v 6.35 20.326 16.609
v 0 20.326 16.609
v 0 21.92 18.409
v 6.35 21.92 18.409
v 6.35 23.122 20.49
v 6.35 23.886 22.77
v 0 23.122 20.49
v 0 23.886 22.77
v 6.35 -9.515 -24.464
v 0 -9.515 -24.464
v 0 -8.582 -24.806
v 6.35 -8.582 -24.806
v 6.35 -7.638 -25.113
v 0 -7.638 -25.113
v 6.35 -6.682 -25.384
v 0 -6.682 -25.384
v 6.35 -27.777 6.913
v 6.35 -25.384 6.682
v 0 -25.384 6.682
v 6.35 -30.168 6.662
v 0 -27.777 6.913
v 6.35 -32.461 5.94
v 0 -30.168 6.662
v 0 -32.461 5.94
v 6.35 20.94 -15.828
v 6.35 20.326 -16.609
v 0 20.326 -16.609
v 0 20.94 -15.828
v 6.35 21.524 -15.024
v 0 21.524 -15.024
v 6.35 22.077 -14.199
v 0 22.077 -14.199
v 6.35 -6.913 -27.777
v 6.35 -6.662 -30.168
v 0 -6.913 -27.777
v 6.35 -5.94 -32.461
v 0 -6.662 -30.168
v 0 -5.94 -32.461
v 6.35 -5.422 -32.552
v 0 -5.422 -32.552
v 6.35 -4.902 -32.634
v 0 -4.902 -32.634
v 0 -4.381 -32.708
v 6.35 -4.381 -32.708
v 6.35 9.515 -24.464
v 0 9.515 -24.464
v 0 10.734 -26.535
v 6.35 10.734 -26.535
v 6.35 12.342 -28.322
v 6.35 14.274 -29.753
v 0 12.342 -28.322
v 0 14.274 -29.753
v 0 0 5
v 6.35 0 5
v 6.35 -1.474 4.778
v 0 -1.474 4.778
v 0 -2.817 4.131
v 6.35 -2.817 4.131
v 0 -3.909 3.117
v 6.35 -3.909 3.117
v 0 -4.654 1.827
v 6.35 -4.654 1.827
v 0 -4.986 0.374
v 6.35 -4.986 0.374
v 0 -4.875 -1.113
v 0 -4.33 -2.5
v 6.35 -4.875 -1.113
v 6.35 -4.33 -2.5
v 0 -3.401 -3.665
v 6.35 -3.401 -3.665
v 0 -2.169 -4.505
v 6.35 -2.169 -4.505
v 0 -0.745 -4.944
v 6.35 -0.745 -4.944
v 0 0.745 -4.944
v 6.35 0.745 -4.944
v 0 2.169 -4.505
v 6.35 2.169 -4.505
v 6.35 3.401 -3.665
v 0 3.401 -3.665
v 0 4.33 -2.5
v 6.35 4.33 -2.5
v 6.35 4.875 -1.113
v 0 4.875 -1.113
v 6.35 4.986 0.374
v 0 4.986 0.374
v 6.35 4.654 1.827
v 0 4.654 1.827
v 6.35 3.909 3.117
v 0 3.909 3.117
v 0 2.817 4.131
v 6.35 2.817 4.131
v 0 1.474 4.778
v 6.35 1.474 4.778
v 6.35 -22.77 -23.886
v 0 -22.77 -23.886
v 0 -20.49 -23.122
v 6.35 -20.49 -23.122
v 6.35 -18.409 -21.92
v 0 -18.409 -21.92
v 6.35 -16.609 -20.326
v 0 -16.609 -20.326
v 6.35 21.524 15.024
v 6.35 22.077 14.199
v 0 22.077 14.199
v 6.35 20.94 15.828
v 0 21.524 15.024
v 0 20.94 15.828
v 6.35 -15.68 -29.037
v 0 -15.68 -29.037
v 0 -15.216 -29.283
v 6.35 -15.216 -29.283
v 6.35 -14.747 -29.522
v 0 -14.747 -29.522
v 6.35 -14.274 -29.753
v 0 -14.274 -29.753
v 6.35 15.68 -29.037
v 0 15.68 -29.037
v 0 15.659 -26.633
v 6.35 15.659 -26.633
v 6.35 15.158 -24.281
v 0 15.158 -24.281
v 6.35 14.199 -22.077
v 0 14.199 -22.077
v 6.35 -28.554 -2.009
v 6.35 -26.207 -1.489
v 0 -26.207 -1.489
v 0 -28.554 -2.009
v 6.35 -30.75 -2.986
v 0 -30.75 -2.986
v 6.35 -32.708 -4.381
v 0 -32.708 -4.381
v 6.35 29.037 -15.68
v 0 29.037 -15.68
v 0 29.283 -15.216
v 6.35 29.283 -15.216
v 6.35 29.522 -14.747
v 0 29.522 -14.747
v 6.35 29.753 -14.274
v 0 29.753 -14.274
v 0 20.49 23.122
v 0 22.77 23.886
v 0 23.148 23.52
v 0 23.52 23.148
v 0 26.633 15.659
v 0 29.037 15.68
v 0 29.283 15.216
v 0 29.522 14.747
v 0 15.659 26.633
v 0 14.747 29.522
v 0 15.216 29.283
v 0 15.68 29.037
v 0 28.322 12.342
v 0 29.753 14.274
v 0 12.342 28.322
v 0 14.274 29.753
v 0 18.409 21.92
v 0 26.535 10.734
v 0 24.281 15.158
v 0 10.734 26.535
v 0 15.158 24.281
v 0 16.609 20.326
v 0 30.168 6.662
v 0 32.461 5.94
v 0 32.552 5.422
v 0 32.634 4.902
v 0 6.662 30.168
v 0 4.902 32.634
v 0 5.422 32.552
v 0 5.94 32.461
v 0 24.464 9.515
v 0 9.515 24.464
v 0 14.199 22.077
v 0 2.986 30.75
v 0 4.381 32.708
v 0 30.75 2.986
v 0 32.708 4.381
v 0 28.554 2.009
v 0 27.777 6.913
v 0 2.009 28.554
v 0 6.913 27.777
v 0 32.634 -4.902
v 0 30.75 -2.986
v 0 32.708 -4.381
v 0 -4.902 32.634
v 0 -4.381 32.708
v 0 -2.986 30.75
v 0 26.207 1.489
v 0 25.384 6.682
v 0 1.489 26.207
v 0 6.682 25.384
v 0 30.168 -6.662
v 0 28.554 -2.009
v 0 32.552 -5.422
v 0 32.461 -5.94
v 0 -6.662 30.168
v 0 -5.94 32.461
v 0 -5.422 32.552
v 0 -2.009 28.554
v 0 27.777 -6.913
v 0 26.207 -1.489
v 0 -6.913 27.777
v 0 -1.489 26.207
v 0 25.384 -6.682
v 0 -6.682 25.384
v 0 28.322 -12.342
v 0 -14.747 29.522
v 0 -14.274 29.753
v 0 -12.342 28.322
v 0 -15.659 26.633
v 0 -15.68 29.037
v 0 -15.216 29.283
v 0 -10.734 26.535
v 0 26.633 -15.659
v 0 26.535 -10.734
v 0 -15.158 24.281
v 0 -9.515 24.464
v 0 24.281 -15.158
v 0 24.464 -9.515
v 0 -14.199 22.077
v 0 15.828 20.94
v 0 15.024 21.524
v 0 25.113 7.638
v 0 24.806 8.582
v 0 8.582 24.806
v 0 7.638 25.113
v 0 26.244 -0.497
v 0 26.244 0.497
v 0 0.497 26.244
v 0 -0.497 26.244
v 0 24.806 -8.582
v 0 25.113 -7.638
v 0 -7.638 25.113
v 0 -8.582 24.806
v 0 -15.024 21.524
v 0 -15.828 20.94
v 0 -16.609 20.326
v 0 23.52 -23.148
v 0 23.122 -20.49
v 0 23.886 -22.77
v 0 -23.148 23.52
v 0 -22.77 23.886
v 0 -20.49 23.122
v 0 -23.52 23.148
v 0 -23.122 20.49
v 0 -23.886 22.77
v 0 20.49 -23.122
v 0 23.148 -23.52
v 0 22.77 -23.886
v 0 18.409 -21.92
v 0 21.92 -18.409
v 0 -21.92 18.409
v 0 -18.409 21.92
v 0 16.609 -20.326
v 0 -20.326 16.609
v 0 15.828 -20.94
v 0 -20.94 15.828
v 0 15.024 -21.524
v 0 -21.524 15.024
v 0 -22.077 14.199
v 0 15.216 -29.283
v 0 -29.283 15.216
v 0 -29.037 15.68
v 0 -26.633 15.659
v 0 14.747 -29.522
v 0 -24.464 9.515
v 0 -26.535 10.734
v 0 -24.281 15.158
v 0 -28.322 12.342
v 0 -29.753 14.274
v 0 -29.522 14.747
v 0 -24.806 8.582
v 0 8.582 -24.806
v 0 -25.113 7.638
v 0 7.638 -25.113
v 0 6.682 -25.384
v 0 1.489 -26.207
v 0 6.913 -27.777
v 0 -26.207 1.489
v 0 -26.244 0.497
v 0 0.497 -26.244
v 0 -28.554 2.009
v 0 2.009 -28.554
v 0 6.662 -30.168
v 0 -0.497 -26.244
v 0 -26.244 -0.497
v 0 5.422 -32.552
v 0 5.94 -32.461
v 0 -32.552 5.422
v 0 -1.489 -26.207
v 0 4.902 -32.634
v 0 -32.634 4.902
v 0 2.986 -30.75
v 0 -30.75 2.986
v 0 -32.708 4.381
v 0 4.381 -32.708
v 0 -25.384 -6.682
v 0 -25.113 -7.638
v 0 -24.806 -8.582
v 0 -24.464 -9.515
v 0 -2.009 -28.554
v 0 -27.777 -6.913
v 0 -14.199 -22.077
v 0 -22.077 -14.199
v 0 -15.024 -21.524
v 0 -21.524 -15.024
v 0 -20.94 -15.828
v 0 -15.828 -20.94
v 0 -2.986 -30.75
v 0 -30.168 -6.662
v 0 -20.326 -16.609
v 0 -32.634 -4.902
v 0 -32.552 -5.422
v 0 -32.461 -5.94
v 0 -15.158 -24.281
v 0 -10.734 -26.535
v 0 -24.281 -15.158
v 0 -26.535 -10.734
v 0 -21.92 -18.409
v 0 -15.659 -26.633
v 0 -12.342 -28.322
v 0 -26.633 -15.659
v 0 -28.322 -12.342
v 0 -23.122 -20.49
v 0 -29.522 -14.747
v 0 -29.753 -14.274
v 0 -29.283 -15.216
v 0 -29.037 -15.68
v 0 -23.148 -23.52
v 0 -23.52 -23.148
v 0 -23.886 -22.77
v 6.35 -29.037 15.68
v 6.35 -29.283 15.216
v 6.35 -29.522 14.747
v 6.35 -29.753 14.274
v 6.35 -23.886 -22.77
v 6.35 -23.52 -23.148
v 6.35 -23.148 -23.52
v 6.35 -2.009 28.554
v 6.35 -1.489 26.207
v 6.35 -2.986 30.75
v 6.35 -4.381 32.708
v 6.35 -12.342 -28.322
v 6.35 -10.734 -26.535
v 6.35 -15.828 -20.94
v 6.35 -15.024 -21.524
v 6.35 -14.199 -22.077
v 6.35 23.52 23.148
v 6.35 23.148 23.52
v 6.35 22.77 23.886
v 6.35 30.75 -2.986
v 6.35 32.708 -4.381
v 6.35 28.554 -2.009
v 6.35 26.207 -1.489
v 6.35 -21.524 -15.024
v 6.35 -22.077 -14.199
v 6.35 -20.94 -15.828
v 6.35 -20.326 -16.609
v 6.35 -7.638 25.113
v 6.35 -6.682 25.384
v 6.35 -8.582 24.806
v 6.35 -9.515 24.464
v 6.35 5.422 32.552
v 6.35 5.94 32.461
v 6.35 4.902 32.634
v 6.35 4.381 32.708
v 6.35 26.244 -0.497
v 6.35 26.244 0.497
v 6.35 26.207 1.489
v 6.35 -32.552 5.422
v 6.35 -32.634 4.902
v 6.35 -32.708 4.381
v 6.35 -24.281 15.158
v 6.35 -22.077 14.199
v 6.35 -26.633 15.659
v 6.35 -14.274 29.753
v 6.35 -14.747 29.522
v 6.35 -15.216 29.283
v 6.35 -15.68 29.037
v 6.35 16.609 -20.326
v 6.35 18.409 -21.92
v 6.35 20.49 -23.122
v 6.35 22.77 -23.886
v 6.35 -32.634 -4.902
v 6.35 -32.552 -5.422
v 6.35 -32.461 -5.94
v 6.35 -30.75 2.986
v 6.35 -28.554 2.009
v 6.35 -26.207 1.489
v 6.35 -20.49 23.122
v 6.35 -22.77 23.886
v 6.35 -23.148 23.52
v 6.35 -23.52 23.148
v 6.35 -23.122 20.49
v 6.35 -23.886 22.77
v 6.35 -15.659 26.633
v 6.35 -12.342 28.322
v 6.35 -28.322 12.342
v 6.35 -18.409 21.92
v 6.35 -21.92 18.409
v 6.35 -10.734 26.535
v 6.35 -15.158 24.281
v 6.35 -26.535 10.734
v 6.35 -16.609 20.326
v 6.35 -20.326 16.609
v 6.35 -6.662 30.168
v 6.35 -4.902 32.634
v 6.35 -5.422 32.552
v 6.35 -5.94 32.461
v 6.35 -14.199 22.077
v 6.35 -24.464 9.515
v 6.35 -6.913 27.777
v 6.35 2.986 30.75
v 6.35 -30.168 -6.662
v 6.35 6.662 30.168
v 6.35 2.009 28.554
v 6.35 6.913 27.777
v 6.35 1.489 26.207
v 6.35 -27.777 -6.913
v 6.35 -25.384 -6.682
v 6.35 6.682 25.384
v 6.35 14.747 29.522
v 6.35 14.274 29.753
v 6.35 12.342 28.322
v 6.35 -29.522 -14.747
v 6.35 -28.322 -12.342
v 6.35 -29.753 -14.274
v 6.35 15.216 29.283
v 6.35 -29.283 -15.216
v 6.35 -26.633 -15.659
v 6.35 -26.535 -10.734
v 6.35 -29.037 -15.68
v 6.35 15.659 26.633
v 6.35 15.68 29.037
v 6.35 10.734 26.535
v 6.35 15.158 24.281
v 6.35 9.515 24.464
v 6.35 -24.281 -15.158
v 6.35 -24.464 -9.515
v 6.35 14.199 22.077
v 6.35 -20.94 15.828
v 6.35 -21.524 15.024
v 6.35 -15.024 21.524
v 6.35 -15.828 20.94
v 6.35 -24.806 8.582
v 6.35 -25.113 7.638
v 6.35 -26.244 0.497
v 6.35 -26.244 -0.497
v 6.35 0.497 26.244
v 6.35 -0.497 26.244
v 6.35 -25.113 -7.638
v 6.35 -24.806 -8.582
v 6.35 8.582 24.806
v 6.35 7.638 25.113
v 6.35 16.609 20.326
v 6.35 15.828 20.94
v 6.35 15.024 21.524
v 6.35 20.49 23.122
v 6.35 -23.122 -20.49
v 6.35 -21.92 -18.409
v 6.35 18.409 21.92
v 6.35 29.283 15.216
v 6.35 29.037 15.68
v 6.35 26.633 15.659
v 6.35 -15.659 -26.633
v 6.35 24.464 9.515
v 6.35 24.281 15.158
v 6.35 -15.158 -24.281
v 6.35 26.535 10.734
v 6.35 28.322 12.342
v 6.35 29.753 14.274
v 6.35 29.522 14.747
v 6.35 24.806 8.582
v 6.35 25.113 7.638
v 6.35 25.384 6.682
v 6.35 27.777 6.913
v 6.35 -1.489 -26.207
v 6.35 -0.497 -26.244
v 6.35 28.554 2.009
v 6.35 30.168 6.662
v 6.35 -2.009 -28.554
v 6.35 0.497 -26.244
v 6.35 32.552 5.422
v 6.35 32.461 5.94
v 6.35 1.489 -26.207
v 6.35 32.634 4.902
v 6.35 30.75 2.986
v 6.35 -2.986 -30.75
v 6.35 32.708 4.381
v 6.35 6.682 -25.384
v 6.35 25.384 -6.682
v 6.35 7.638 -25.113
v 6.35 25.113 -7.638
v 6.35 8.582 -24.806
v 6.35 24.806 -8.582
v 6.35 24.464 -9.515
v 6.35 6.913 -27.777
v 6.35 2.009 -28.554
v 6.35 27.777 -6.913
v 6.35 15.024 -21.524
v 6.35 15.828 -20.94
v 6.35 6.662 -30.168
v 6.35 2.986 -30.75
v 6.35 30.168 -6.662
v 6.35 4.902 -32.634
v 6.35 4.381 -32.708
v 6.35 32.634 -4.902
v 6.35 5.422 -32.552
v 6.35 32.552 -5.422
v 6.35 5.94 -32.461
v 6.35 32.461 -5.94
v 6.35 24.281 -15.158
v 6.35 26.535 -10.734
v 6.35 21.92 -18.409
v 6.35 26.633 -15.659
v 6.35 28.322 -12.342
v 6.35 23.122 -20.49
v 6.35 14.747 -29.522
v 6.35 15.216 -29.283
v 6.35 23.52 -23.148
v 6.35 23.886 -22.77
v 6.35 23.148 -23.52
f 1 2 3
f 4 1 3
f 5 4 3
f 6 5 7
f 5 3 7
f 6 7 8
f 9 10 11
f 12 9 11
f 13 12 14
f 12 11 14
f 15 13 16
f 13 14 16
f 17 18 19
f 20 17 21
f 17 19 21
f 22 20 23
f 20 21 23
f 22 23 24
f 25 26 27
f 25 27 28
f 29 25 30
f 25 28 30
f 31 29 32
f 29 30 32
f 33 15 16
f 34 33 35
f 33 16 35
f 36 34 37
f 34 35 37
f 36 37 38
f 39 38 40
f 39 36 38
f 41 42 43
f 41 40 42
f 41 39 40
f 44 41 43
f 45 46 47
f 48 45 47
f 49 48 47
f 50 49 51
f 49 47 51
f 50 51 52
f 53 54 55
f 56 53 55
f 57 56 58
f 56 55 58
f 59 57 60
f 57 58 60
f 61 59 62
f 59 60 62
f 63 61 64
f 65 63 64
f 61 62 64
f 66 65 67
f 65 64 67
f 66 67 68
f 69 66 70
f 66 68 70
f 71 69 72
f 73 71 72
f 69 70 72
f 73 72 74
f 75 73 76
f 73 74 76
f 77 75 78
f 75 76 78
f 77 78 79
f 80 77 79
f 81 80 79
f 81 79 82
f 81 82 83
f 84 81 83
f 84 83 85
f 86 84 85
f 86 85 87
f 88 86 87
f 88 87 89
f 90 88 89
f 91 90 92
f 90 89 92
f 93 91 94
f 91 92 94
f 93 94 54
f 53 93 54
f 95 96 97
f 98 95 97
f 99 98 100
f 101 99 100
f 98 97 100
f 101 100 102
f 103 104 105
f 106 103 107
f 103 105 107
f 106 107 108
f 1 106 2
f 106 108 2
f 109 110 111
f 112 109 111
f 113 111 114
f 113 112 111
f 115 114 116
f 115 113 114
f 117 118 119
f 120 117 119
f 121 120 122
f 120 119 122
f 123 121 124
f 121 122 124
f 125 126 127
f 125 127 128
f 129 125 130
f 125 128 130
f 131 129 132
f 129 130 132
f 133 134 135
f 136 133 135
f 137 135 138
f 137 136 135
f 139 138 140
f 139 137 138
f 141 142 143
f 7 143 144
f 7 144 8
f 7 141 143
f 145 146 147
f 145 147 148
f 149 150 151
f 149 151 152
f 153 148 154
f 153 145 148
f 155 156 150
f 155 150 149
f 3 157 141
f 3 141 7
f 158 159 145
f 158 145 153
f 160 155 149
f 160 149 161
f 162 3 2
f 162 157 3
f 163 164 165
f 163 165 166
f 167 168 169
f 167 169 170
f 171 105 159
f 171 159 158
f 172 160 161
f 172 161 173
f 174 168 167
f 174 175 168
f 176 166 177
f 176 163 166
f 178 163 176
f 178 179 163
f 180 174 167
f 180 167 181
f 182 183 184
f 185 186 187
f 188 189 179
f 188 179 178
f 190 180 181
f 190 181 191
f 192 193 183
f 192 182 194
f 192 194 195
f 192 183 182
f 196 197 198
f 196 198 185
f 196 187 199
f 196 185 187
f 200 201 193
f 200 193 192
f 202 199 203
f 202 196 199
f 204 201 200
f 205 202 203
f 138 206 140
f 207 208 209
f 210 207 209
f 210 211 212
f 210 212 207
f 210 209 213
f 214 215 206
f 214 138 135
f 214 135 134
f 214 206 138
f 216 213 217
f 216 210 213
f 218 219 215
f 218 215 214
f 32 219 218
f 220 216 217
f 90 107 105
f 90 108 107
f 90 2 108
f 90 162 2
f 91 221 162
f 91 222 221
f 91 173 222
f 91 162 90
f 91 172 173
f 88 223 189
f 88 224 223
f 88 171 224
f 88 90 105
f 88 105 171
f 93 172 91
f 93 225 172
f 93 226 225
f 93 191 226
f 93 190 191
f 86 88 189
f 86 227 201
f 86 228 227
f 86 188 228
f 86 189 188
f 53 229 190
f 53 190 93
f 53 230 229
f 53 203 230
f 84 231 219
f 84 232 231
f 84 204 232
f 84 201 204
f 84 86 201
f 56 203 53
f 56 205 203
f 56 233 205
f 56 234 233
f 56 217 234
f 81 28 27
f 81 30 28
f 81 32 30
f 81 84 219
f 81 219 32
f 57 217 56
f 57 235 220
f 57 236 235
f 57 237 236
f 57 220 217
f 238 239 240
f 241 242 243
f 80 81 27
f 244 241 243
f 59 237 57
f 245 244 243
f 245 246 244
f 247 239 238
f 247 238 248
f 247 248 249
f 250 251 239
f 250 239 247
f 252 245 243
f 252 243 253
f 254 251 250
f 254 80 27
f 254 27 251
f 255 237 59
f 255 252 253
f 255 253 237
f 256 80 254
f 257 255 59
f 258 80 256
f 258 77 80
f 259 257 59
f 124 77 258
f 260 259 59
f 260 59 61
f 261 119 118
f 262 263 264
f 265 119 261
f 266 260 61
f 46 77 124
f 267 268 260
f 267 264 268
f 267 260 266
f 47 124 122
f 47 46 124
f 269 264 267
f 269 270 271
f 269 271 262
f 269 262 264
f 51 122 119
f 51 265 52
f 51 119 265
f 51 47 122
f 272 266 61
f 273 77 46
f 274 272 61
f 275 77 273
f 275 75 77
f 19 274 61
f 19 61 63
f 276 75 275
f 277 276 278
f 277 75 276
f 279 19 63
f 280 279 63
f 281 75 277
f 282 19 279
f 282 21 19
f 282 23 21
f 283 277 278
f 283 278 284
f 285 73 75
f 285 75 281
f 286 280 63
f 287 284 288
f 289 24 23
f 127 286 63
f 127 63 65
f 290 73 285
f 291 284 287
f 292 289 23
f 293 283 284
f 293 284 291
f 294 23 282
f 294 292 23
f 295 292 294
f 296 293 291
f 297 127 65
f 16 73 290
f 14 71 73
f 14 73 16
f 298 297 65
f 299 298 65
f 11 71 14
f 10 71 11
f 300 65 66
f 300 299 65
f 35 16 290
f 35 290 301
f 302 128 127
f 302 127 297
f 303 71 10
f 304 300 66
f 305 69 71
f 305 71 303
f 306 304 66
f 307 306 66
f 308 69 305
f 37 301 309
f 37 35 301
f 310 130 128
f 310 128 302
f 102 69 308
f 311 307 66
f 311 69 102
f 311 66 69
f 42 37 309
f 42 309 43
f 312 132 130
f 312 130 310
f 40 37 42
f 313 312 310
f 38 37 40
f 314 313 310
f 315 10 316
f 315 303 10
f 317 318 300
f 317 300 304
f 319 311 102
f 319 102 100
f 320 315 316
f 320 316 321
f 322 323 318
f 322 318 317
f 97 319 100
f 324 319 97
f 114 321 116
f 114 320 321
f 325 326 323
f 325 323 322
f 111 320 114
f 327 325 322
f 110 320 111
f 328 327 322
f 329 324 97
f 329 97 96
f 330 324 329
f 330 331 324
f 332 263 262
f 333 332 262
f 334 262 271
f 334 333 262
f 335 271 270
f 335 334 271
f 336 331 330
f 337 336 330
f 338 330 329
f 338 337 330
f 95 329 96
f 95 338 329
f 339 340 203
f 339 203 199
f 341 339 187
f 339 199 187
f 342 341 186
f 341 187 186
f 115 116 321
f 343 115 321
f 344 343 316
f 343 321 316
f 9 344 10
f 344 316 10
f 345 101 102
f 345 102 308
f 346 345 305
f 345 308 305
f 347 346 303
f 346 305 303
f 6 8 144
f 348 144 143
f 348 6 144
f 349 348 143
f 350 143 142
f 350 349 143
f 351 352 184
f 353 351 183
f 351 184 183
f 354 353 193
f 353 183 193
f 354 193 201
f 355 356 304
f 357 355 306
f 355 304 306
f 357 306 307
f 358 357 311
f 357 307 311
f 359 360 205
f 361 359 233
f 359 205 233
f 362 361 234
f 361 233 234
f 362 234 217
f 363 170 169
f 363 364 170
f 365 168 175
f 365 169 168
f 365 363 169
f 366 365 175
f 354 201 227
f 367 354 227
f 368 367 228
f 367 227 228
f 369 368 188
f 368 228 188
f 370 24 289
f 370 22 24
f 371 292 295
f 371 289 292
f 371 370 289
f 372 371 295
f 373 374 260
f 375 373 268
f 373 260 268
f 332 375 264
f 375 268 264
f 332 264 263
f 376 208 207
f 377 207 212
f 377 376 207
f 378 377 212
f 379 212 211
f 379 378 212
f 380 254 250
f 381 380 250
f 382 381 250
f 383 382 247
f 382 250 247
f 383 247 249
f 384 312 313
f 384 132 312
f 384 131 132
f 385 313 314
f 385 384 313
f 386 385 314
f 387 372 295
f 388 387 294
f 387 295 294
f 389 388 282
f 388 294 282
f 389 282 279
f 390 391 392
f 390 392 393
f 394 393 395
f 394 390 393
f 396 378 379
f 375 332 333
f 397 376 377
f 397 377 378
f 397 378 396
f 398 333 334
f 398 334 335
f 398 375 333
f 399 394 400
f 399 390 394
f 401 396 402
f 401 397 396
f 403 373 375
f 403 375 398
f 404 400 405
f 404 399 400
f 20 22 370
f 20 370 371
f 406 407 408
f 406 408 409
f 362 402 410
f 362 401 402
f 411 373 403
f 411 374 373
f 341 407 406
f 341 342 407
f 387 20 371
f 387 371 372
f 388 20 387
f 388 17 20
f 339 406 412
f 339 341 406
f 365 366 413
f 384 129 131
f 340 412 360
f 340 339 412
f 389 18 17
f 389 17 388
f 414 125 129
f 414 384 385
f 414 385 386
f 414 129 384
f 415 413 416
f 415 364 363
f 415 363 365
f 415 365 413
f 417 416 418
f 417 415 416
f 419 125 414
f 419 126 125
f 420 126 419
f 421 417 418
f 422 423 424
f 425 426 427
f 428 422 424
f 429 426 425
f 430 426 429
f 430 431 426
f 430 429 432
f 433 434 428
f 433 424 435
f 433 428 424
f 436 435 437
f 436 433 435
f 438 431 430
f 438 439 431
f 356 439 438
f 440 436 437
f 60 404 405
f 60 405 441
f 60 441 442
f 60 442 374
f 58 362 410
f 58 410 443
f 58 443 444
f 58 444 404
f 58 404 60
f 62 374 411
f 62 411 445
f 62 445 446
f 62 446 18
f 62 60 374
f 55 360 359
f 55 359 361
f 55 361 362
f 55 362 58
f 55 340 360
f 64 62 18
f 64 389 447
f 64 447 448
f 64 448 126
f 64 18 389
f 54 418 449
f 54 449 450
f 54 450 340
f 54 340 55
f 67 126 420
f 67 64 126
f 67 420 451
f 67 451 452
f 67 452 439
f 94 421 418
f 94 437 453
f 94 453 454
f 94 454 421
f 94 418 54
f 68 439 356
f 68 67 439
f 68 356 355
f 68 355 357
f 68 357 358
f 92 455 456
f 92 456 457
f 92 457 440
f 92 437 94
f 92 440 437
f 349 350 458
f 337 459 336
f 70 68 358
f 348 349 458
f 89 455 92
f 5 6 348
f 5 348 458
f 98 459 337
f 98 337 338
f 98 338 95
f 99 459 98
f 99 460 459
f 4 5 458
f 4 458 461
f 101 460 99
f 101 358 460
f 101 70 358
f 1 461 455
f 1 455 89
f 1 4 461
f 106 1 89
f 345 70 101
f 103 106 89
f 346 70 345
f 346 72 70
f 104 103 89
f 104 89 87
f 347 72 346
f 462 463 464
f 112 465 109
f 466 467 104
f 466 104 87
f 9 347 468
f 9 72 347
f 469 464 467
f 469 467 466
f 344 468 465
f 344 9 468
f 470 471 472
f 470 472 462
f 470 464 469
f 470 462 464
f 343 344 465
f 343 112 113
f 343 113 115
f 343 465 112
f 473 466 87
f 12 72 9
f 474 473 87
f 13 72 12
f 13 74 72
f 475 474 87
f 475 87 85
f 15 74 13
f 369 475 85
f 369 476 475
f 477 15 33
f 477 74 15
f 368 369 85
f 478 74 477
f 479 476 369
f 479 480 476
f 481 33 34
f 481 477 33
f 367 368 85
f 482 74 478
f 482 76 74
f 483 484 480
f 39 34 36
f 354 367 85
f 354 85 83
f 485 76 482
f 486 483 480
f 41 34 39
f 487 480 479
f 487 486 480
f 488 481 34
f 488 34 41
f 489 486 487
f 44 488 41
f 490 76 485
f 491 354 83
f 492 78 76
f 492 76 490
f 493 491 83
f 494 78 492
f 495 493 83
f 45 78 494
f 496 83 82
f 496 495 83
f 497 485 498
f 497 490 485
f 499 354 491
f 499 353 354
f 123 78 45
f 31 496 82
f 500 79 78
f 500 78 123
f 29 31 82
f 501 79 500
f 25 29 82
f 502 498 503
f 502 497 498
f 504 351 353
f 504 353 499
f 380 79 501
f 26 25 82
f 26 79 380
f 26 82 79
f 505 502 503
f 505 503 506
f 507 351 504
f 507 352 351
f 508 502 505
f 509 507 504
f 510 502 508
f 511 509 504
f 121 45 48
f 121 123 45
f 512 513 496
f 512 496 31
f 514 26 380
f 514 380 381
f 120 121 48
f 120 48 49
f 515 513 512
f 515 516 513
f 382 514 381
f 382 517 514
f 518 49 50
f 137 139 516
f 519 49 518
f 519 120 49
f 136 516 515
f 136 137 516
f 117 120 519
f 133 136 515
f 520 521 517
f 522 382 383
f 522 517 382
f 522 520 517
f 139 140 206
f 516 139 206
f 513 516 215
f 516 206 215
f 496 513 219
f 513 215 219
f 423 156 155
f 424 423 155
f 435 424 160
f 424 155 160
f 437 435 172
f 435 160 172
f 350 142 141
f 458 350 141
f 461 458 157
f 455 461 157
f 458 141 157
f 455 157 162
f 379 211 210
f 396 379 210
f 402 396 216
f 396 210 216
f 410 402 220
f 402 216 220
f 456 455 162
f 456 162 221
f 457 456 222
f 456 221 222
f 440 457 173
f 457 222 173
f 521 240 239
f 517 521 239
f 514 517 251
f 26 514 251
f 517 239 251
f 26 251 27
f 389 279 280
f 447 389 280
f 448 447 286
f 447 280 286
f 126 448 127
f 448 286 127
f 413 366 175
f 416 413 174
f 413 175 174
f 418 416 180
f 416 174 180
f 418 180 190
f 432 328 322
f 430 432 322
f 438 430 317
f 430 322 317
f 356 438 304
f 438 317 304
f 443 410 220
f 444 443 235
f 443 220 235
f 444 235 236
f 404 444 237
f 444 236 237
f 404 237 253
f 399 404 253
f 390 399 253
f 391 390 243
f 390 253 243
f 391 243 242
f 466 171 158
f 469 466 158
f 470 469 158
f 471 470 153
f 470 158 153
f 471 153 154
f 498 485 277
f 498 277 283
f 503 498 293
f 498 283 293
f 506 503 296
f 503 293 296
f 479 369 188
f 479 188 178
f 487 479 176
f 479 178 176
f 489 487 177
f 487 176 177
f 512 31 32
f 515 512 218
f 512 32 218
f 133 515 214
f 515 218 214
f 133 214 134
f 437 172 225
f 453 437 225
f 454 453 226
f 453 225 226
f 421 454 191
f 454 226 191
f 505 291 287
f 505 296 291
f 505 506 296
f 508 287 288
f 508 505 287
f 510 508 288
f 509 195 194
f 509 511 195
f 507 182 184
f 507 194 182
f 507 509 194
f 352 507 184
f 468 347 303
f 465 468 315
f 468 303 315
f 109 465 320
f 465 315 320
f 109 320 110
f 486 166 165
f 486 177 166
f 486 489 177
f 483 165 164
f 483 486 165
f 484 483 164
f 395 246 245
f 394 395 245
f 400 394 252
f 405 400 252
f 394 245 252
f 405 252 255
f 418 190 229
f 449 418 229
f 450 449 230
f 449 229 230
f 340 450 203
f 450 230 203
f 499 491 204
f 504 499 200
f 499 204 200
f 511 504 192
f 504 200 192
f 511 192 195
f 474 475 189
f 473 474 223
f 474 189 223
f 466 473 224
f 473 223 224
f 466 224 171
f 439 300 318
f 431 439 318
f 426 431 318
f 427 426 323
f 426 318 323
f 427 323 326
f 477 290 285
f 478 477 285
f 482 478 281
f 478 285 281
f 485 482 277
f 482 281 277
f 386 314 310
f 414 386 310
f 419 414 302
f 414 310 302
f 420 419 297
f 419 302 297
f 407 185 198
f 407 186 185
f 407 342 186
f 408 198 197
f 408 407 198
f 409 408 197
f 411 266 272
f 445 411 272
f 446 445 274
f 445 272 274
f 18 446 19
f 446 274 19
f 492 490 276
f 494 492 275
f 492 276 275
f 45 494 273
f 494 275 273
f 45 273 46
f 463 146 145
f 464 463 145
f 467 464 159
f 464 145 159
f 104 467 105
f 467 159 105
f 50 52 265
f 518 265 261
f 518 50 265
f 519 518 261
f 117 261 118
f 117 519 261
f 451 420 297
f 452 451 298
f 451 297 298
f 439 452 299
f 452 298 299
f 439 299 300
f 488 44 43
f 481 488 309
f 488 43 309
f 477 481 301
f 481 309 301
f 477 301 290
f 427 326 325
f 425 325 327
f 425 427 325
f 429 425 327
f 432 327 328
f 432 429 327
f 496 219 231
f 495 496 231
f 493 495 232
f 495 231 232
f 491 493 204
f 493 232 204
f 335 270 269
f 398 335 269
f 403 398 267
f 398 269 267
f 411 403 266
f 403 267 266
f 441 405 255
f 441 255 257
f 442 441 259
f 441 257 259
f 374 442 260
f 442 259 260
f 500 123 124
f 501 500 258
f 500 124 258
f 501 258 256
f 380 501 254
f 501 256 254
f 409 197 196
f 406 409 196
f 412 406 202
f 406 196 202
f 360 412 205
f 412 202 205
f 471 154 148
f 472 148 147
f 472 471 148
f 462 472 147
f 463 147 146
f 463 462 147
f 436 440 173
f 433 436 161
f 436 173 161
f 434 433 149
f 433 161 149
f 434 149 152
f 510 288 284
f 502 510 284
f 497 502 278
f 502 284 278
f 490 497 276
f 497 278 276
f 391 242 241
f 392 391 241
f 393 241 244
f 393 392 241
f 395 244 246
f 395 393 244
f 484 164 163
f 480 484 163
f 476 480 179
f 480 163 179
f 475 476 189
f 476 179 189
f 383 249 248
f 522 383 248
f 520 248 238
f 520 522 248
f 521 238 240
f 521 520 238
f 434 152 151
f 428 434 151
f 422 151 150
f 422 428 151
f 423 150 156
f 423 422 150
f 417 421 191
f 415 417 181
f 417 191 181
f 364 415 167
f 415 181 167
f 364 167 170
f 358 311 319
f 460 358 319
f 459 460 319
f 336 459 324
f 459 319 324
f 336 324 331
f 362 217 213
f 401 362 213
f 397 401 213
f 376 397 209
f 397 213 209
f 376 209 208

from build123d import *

# Parameters (mm, degrees)
BASPROSKE_W        = 12.7
BASPROSKE_H        = 33
TOOTHCUT_DEPTH     = 49.366207211
TEETHCUTS_COUNT    = 20
TEETHCUTS_ANGLE    = 342
BORSKE_R           = 5
BORE_DEPTH         = 50.0000508
CUT_EXTRUDE1_START = -6.35
CUT_EXTRUDE1_DEPTH = 6.35


with BuildPart() as part:
    # BasProSke → Base-Revolve (revolve)
    with BuildSketch(Plane(origin=(0, 0, 0), x_dir=(1, 0, 0), z_dir=(0, 1, 0)), mode=Mode.PRIVATE) as base_revolve_sk:
        with Locations((6.35, 16.5)):
            Rectangle(BASPROSKE_W, BASPROSKE_H)
    revolve(base_revolve_sk.sketch.rotate(Axis((-10, 0, 0), (1, 0, 0)), 180), axis=Axis((-10, 0, 0), (1, 0, 0)))

    # TooCutSke → ToothCut (cut, through all)
    with BuildSketch(Plane(origin=(0, 0, 0), x_dir=(0, 0, -1), z_dir=(1, 0, 0))):
        with BuildLine():
            ThreePointArc((1.489278925, 26.206717637), (0, 26.249), (-1.489278925, 26.206717637))
            ThreePointArc((-1.489278925, 26.206717637), (-2.448651415, 29.690511169), (-4.401620335, 32.730762038))
            ThreePointArc((-4.401620335, 32.730762038), (0, 33.0254), (4.401620335, 32.730762038))
            ThreePointArc((4.401620335, 32.730762038), (2.448651415, 29.690511169), (1.489278925, 26.206717637))
        make_face()
    toothcut = extrude(amount=TOOTHCUT_DEPTH, mode=Mode.SUBTRACT)

    # TeethCuts: ToothCut ×20 about axis
    teethcuts_axis = Axis((-10, 0, 0), (1, 0, 0))
    for i in range(1, TEETHCUTS_COUNT):
        add(toothcut.rotate(teethcuts_axis, i * TEETHCUTS_ANGLE / (TEETHCUTS_COUNT - 1)), mode=Mode.SUBTRACT)

    # BorSke → Bore (cut, symmetric)
    with BuildSketch(Plane(origin=(0, 0, 0), x_dir=(0, 0, -1), z_dir=(1, 0, 0))):
        with Locations(Location((0, 0, 0), (0, 0, 180))):
            Circle(BORSKE_R)
    extrude(amount=BORE_DEPTH, both=True, mode=Mode.SUBTRACT)

    # Sketch1 → Cut-Extrude1 (cut)
    with BuildSketch(Plane(origin=(12.7, 0, 0), x_dir=(0, 0, -1), z_dir=(1, 0, 0)).offset(CUT_EXTRUDE1_START)):
        with BuildLine():
            ThreePointArc((-32.707837592, 4.381479207), (-29.676574647, 2.442440757), (-26.206717637, 1.489278925))
            ThreePointArc((-26.206717637, 1.489278925), (-26.249, 0), (-26.206717637, -1.489278925))
            ThreePointArc((-26.206717637, -1.489278925), (-29.676574647, -2.442440757), (-32.707837592, -4.381479207))
            ThreePointArc((-32.707837592, -4.381479207), (-32.59371524, -5.162337346), (-32.460953611, -5.940243315))
            ThreePointArc((-32.460953611, -5.940243315), (-28.978855401, -6.847666703), (-25.384282076, -6.68193269))
            ThreePointArc((-25.384282076, -6.68193269), (-24.964282496, -8.111387085), (-24.463857082, -9.514709543))
            ThreePointArc((-24.463857082, -9.514709543), (-27.469343998, -11.493465099), (-29.753050541, -14.274312016))
            ThreePointArc((-29.753050541, -14.274312016), (-29.403215298, -14.981686491), (-29.036565322, -15.680493433))
            ThreePointArc((-29.036565322, -15.680493433), (-25.444483881, -15.467476836), (-22.077056123, -14.199070178))
            ThreePointArc((-22.077056123, -14.199070178), (-21.235887085, -15.428775087), (-20.326303746, -16.608774097))
            ThreePointArc((-20.326303746, -16.608774097), (-22.573222567, -19.419428996), (-23.885827601, -22.76987571))
            ThreePointArc((-23.885827601, -22.76987571), (-23.334523779, -23.334523779), (-22.76987571, -23.885827601))
            ThreePointArc((-22.76987571, -23.885827601), (-19.419428996, -22.573222567), (-16.608774097, -20.326303746))
            ThreePointArc((-16.608774097, -20.326303746), (-15.428775087, -21.235887085), (-14.199070178, -22.077056123))
            ThreePointArc((-14.199070178, -22.077056123), (-15.467476836, -25.444483881), (-15.680493433, -29.036565322))
            ThreePointArc((-15.680493433, -29.036565322), (-14.981686491, -29.403215298), (-14.274312016, -29.753050541))
            ThreePointArc((-14.274312016, -29.753050541), (-11.493465099, -27.469343998), (-9.514709543, -24.463857082))
            ThreePointArc((-9.514709543, -24.463857082), (-8.111387085, -24.964282496), (-6.68193269, -25.384282076))
            ThreePointArc((-6.68193269, -25.384282076), (-6.847666703, -28.978855401), (-5.940243315, -32.460953611))
            ThreePointArc((-5.940243315, -32.460953611), (-5.162337346, -32.59371524), (-4.381479207, -32.707837592))
            ThreePointArc((-4.381479207, -32.707837592), (-2.442440757, -29.676574647), (-1.489278925, -26.206717637))
            ThreePointArc((-1.489278925, -26.206717637), (0, -26.249), (1.489278925, -26.206717637))
            ThreePointArc((1.489278925, -26.206717637), (2.442440757, -29.676574647), (4.381479207, -32.707837592))
            ThreePointArc((4.381479207, -32.707837592), (5.162337346, -32.59371524), (5.940243315, -32.460953611))
            ThreePointArc((5.940243315, -32.460953611), (6.847666703, -28.978855401), (6.68193269, -25.384282076))
            ThreePointArc((6.68193269, -25.384282076), (8.111387085, -24.964282496), (9.514709543, -24.463857082))
            ThreePointArc((9.514709543, -24.463857082), (11.493465099, -27.469343998), (14.274312016, -29.753050541))
            ThreePointArc((14.274312016, -29.753050541), (14.981686491, -29.403215298), (15.680493433, -29.036565322))
            ThreePointArc((15.680493433, -29.036565322), (15.467476836, -25.444483881), (14.199070178, -22.077056123))
            ThreePointArc((14.199070178, -22.077056123), (15.428775087, -21.235887085), (16.608774097, -20.326303746))
            ThreePointArc((16.608774097, -20.326303746), (19.419428996, -22.573222567), (22.76987571, -23.885827601))
            ThreePointArc((22.76987571, -23.885827601), (23.334523779, -23.334523779), (23.885827601, -22.76987571))
            ThreePointArc((23.885827601, -22.76987571), (22.573222567, -19.419428996), (20.326303746, -16.608774097))
            ThreePointArc((20.326303746, -16.608774097), (21.235887085, -15.428775087), (22.077056123, -14.199070178))
            ThreePointArc((22.077056123, -14.199070178), (25.444483881, -15.467476836), (29.036565322, -15.680493433))
            ThreePointArc((29.036565322, -15.680493433), (29.403215298, -14.981686491), (29.753050541, -14.274312016))
            ThreePointArc((29.753050541, -14.274312016), (27.469343998, -11.493465099), (24.463857082, -9.514709543))
            ThreePointArc((24.463857082, -9.514709543), (24.964282496, -8.111387085), (25.384282076, -6.68193269))
            ThreePointArc((25.384282076, -6.68193269), (28.978855401, -6.847666703), (32.460953611, -5.940243315))
            ThreePointArc((32.460953611, -5.940243315), (32.59371524, -5.162337346), (32.707837592, -4.381479207))
            ThreePointArc((32.707837592, -4.381479207), (29.676574647, -2.442440757), (26.206717637, -1.489278925))
            ThreePointArc((26.206717637, -1.489278925), (26.249, 0), (26.206717637, 1.489278925))
            ThreePointArc((26.206717637, 1.489278925), (29.676574647, 2.442440757), (32.707837592, 4.381479207))
            ThreePointArc((32.707837592, 4.381479207), (32.59371524, 5.162337346), (32.460953611, 5.940243315))
            ThreePointArc((32.460953611, 5.940243315), (28.978855401, 6.847666703), (25.384282076, 6.68193269))
            ThreePointArc((25.384282076, 6.68193269), (24.964282496, 8.111387085), (24.463857082, 9.514709543))
            ThreePointArc((24.463857082, 9.514709543), (27.469343998, 11.493465099), (29.753050541, 14.274312016))
            ThreePointArc((29.753050541, 14.274312016), (29.403215298, 14.981686491), (29.036565322, 15.680493433))
            ThreePointArc((29.036565322, 15.680493433), (25.444483881, 15.467476836), (22.077056123, 14.199070178))
            ThreePointArc((22.077056123, 14.199070178), (21.235887085, 15.428775087), (20.326303746, 16.608774097))
            ThreePointArc((20.326303746, 16.608774097), (22.573222567, 19.419428996), (23.885827601, 22.76987571))
            ThreePointArc((23.885827601, 22.76987571), (23.334523779, 23.334523779), (22.76987571, 23.885827601))
            ThreePointArc((22.76987571, 23.885827601), (19.419428996, 22.573222567), (16.608774097, 20.326303746))
            ThreePointArc((16.608774097, 20.326303746), (15.428775087, 21.235887085), (14.199070178, 22.077056123))
            ThreePointArc((14.199070178, 22.077056123), (15.467476836, 25.444483881), (15.680493433, 29.036565322))
            ThreePointArc((15.680493433, 29.036565322), (14.981686491, 29.403215298), (14.274312016, 29.753050541))
            ThreePointArc((14.274312016, 29.753050541), (11.493465099, 27.469343998), (9.514709543, 24.463857082))
            ThreePointArc((9.514709543, 24.463857082), (8.111387085, 24.964282496), (6.68193269, 25.384282076))
            ThreePointArc((6.68193269, 25.384282076), (6.847666703, 28.978855401), (5.940243315, 32.460953611))
            ThreePointArc((5.940243315, 32.460953611), (5.162337346, 32.59371524), (4.381479207, 32.707837592))
            ThreePointArc((4.381479207, 32.707837592), (2.442440757, 29.676574647), (1.489278925, 26.206717637))
            ThreePointArc((1.489278925, 26.206717637), (0, 26.249), (-1.489278925, 26.206717637))
            ThreePointArc((-1.489278925, 26.206717637), (-2.442440757, 29.676574647), (-4.381479207, 32.707837592))
            ThreePointArc((-4.381479207, 32.707837592), (-5.162337346, 32.59371524), (-5.940243315, 32.460953611))
            ThreePointArc((-5.940243315, 32.460953611), (-6.847666703, 28.978855401), (-6.68193269, 25.384282076))
            ThreePointArc((-6.68193269, 25.384282076), (-8.111387085, 24.964282496), (-9.514709543, 24.463857082))
            ThreePointArc((-9.514709543, 24.463857082), (-11.493465099, 27.469343998), (-14.274312016, 29.753050541))
            ThreePointArc((-14.274312016, 29.753050541), (-14.981686491, 29.403215298), (-15.680493433, 29.036565322))
            ThreePointArc((-15.680493433, 29.036565322), (-15.467476836, 25.444483881), (-14.199070178, 22.077056123))
            ThreePointArc((-14.199070178, 22.077056123), (-15.428775087, 21.235887085), (-16.608774097, 20.326303746))
            ThreePointArc((-16.608774097, 20.326303746), (-19.419428996, 22.573222567), (-22.76987571, 23.885827601))
            ThreePointArc((-22.76987571, 23.885827601), (-23.334523779, 23.334523779), (-23.885827601, 22.76987571))
            ThreePointArc((-23.885827601, 22.76987571), (-22.573222567, 19.419428996), (-20.326303746, 16.608774097))
            ThreePointArc((-20.326303746, 16.608774097), (-21.235887085, 15.428775087), (-22.077056123, 14.199070178))
            ThreePointArc((-22.077056123, 14.199070178), (-25.444483881, 15.467476836), (-29.036565322, 15.680493433))
            ThreePointArc((-29.036565322, 15.680493433), (-29.403215298, 14.981686491), (-29.753050541, 14.274312016))
            ThreePointArc((-29.753050541, 14.274312016), (-27.469343998, 11.493465099), (-24.463857082, 9.514709543))
            ThreePointArc((-24.463857082, 9.514709543), (-24.964282496, 8.111387085), (-25.384282076, 6.68193269))
            ThreePointArc((-25.384282076, 6.68193269), (-28.978855401, 6.847666703), (-32.460953611, 5.940243315))
            ThreePointArc((-32.460953611, 5.940243315), (-32.59371524, 5.162337346), (-32.707837592, 4.381479207))
        make_face()
    extrude(amount=CUT_EXTRUDE1_DEPTH, mode=Mode.SUBTRACT)


solid = part.part
